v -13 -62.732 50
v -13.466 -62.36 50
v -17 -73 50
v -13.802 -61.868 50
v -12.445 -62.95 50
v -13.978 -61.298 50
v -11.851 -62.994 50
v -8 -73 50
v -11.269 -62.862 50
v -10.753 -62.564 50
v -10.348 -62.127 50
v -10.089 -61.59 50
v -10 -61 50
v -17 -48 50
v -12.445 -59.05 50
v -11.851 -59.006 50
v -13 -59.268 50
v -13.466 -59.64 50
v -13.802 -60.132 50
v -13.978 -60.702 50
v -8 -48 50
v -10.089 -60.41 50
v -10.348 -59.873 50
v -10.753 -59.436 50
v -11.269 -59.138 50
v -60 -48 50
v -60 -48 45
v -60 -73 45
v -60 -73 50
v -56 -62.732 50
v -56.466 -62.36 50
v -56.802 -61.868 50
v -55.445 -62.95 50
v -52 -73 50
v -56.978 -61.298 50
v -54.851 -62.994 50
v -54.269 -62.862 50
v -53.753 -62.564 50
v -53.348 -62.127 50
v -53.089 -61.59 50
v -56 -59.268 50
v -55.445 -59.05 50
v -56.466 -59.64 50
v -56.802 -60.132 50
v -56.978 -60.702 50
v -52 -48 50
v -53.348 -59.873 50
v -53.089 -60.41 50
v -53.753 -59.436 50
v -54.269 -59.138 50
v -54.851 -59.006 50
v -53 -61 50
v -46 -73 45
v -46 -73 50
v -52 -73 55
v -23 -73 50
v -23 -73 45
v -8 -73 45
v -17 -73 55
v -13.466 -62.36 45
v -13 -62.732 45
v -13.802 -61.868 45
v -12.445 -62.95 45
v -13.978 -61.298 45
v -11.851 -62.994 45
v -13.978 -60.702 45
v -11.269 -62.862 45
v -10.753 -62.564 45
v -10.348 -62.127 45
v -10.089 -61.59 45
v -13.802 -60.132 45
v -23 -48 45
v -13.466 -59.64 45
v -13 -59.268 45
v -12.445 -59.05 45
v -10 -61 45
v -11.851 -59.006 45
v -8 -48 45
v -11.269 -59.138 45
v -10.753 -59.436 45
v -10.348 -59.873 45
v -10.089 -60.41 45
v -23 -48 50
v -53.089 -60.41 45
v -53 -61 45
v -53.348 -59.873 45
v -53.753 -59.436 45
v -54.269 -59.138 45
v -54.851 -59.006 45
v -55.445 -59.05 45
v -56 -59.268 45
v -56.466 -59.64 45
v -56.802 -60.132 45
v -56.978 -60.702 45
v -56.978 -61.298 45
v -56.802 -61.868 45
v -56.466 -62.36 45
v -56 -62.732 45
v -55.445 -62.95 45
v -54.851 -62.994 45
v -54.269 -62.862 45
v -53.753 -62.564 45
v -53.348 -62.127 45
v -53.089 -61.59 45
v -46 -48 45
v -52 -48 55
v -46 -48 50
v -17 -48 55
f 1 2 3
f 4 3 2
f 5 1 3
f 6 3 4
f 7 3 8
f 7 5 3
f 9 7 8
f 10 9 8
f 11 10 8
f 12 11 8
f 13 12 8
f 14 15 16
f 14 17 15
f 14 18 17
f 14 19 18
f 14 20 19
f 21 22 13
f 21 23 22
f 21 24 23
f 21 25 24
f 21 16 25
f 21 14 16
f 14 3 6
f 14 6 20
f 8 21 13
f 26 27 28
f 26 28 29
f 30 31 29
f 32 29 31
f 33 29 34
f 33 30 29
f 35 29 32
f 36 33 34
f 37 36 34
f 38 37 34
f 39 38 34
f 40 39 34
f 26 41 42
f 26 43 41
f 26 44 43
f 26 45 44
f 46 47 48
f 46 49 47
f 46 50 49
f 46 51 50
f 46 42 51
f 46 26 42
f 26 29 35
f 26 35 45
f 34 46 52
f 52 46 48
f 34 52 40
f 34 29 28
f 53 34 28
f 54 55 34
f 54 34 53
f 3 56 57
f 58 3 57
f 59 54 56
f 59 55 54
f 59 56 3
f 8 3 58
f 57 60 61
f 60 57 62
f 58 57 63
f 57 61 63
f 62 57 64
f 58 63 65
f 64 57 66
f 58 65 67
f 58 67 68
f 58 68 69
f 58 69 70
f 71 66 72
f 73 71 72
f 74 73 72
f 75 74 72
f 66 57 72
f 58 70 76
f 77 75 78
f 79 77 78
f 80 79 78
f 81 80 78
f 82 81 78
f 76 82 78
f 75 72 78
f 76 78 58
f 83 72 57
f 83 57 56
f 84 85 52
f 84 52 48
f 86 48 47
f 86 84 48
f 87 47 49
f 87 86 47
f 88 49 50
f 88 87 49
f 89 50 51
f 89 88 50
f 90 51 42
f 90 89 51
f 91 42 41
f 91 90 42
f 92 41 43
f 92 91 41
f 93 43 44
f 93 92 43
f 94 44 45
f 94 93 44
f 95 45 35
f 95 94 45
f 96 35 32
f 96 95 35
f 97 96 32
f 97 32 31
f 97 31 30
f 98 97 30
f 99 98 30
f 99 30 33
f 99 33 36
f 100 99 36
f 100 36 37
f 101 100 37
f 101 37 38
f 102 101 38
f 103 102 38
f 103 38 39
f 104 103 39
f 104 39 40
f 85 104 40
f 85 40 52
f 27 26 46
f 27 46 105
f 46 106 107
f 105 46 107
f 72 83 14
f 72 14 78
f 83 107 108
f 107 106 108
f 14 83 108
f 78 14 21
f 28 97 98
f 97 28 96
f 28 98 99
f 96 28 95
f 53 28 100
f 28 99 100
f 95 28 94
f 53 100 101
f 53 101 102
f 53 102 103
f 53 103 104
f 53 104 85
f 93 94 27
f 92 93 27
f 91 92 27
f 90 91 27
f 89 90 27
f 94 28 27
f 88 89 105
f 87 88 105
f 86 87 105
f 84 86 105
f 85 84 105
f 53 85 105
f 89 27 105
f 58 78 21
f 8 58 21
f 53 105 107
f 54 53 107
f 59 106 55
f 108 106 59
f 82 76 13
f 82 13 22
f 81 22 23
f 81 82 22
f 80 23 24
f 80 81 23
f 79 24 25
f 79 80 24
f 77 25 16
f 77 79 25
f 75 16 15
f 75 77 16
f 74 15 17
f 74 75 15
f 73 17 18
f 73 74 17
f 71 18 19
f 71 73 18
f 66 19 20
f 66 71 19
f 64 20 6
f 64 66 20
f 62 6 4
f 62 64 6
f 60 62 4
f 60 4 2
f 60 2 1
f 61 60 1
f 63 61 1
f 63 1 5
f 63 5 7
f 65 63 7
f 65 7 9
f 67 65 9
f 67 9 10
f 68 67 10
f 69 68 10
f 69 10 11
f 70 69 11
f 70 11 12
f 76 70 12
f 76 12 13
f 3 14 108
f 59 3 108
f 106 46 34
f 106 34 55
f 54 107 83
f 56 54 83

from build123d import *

# Parameters (mm, degrees)
CYLINDER188_R          = 2
CYLINDER188_DEPTH      = 13
CYLINDER187_R          = 2
CYLINDER187_DEPTH      = 13
BOX321_W               = 23
BOX321_H               = 5
BOX321_DEPTH           = 25
BOX098_W               = 35
BOX098_H               = 5
BOX098_DEPTH           = 25
BOX097_W               = 52
BOX097_H               = 5
BOX097_DEPTH           = 25
CUT144_PLACEMENT_ANGLE = 90


with BuildPart() as cylinder188:
    # Cylinder188 → Cylinder188 (new body)
    with BuildSketch(Plane(origin=(-12, -69, -5), x_dir=(1, 0, 0), z_dir=(0, 0, 1))):
        Circle(CYLINDER188_R)
    extrude(amount=CYLINDER188_DEPTH)


with BuildPart() as cylinder187:
    # Cylinder187 → Cylinder187 (new body)
    with BuildSketch(Plane(origin=(-55, -69, -5), x_dir=(1, 0, 0), z_dir=(0, 0, 1))):
        Circle(CYLINDER187_R)
    extrude(amount=CYLINDER187_DEPTH)


with BuildPart() as box321:
    # Box321 → Box321 (new body)
    with BuildSketch(Plane(origin=(-46, -93, 16), x_dir=(1, 0, 0), z_dir=(0, 0, 1))):
        with Locations((11.5, 2.5)):
            Rectangle(BOX321_W, BOX321_H)
    extrude(amount=BOX321_DEPTH)


with BuildPart() as box098:
    # Box098 → Box098 (new body)
    with BuildSketch(Plane(origin=(-52, -88, 16), x_dir=(1, 0, 0), z_dir=(0, 0, 1))):
        with Locations((17.5, 2.5)):
            Rectangle(BOX098_W, BOX098_H)
    extrude(amount=BOX098_DEPTH)


with BuildPart() as cut148:
    # Box097 → Box097 (new body)
    with BuildSketch(Plane(origin=(-60, -93, 16), x_dir=(1, 0, 0), z_dir=(0, 0, 1))):
        with Locations((26, 2.5)):
            Rectangle(BOX097_W, BOX097_H)
    extrude(amount=BOX097_DEPTH)

    # Fusion: union Box098
    add(box098.part)

    # Cut144: cut Box321
    add(box321.part, mode=Mode.SUBTRACT)


with BuildPart() as cut148_1:
    # Cut144 placement: moved
    add(cut148.part.moved(Location((0, -40, 96))).rotate(Axis((0, -40, 96), (1, 0, 0)), CUT144_PLACEMENT_ANGLE))

    # Cut147: cut Cylinder187
    add(cylinder187.part, mode=Mode.SUBTRACT)

    # Cut148: cut Cylinder188
    add(cylinder188.part, mode=Mode.SUBTRACT)


with BuildPart() as cut148_2:
    # Cut148 placement: moved
    add(cut148_1.part.moved(Location((0, 8, 42))))


solid = cut148_2.part
